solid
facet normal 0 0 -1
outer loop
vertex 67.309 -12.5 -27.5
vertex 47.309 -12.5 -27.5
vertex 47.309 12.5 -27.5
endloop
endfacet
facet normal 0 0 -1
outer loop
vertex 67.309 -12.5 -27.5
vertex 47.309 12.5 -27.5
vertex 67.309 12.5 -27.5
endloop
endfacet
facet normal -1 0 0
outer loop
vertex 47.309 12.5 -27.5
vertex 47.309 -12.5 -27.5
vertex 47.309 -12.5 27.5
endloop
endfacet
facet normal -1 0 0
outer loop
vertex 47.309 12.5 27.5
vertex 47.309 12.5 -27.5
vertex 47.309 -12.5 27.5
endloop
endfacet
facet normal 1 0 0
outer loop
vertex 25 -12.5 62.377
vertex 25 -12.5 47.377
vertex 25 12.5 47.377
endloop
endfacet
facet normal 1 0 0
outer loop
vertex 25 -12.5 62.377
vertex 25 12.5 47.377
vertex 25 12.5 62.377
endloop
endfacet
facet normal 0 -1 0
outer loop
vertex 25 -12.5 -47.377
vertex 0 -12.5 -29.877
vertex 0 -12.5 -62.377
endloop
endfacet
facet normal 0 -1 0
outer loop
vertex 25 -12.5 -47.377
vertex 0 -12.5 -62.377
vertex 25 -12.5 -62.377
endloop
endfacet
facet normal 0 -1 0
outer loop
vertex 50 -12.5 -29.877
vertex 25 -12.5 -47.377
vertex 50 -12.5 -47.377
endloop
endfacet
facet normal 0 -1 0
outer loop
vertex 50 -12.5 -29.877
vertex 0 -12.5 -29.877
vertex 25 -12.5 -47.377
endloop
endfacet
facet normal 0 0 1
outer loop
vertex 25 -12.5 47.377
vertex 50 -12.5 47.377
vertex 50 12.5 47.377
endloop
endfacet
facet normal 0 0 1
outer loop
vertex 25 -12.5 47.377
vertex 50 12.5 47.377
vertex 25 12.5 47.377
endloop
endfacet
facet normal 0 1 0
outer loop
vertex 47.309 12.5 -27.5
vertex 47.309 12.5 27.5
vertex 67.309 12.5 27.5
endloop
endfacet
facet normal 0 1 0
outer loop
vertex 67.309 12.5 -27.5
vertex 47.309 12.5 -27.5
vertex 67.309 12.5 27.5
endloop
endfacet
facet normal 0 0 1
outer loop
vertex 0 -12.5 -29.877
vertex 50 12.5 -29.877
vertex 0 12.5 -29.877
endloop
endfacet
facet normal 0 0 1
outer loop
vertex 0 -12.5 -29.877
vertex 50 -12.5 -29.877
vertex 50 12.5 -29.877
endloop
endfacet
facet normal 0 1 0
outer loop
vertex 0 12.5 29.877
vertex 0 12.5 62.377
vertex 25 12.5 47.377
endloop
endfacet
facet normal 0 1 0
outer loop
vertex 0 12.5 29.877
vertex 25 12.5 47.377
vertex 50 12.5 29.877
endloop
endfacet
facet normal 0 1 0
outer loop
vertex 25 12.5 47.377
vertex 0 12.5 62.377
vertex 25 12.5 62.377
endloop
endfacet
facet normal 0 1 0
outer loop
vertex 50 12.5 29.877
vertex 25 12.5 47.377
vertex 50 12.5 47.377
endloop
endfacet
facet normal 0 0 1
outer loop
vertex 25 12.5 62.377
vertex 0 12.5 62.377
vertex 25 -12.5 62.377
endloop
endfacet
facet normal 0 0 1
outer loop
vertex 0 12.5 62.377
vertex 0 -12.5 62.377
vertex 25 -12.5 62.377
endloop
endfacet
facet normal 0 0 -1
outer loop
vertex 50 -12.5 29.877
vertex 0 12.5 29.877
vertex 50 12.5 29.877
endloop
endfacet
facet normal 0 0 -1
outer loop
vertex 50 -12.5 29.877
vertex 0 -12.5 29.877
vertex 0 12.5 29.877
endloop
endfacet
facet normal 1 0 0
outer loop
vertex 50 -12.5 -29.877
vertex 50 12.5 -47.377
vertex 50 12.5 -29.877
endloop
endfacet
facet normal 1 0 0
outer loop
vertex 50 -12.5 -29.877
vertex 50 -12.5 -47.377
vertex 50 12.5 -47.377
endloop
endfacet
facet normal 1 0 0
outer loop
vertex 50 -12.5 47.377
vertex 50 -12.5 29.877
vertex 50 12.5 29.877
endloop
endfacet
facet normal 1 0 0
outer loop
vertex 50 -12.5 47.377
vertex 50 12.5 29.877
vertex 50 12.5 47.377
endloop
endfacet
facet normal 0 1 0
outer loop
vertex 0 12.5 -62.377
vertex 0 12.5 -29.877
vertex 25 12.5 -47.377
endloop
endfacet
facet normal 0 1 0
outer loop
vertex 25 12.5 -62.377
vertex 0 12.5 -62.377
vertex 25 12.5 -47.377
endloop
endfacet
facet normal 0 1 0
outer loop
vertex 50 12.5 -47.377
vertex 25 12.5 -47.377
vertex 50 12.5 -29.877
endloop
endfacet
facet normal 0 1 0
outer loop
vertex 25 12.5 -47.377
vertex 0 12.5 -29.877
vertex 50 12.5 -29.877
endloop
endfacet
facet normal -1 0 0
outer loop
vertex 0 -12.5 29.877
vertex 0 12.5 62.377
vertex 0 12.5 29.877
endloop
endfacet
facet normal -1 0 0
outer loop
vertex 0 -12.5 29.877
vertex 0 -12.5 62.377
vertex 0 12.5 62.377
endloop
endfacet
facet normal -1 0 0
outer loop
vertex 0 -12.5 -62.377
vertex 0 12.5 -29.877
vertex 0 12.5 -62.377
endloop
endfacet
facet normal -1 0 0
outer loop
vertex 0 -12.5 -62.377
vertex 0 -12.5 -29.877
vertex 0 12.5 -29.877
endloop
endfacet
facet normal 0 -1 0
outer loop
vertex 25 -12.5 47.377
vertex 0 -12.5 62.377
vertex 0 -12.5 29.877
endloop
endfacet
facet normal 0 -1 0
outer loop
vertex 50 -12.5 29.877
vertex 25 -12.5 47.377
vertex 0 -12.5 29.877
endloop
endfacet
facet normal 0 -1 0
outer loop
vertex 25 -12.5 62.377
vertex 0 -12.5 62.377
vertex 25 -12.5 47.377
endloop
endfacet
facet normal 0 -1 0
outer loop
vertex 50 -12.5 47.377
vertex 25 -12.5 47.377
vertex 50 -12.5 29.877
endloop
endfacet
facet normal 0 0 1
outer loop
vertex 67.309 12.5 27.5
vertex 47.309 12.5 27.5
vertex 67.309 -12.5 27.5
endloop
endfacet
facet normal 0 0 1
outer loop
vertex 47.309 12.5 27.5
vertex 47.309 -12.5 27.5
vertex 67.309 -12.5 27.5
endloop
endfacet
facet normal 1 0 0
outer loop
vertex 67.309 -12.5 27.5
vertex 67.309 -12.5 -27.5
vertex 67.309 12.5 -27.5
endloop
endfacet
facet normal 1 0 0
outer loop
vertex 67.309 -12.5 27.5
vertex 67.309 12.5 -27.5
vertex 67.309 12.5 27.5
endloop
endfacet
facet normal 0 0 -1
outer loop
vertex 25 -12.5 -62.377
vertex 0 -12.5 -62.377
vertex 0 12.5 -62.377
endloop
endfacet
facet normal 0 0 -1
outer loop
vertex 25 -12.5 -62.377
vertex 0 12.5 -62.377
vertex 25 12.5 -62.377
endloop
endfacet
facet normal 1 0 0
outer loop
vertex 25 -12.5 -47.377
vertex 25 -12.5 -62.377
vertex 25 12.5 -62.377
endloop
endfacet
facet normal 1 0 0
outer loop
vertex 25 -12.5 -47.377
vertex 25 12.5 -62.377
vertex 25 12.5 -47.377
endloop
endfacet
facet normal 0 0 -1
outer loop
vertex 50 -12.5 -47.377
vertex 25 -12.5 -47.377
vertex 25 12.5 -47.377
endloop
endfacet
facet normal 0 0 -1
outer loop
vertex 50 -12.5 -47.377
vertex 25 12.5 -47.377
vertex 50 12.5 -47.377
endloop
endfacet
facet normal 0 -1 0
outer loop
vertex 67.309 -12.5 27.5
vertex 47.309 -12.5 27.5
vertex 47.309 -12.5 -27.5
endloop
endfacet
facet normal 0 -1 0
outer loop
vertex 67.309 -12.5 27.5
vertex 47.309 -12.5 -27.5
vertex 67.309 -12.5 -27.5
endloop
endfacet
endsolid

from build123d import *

# Parameters (mm, degrees)
F0_W     = 25
F0_H     = 15
F1_DEPTH = 12.5
F0_W_2   = 20
F0_H_2   = 55


with BuildPart() as f1:
    # F0 (on Front) → F1 (new body, symmetric)
    with BuildSketch(Plane.XZ):
        Polygon((25, 47.3774689436), (0, 47.3774689436), (0, 29.8774689436), (50, 29.8774689436), (50, 47.3774689436), align=None)
        with Locations((12.5, 54.8774689436)):
            Rectangle(F0_W, F0_H)
    extrude(amount=F1_DEPTH, both=True)


with BuildPart() as f1b:
    # F0 (on Front) → F1, piece 2 (new body, symmetric)
    with BuildSketch(Plane.XZ):
        Polygon((0, -29.8774689436), (0, -47.3774689436), (25, -47.3774689436), (50, -47.3774689436), (50, -29.8774689436), align=None)
        with Locations((12.5, -54.8774689436)):
            Rectangle(F0_W, F0_H)
    extrude(amount=F1_DEPTH, both=True)


with BuildPart() as f1c:
    # F0 (on Front) → F1, piece 3 (new body, symmetric)
    with BuildSketch(Plane.XZ):
        with Locations((57.3086179793, 0)):
            Rectangle(F0_W_2, F0_H_2)
    extrude(amount=F1_DEPTH, both=True)


solid = Compound([f1.part, f1b.part, f1c.part])
